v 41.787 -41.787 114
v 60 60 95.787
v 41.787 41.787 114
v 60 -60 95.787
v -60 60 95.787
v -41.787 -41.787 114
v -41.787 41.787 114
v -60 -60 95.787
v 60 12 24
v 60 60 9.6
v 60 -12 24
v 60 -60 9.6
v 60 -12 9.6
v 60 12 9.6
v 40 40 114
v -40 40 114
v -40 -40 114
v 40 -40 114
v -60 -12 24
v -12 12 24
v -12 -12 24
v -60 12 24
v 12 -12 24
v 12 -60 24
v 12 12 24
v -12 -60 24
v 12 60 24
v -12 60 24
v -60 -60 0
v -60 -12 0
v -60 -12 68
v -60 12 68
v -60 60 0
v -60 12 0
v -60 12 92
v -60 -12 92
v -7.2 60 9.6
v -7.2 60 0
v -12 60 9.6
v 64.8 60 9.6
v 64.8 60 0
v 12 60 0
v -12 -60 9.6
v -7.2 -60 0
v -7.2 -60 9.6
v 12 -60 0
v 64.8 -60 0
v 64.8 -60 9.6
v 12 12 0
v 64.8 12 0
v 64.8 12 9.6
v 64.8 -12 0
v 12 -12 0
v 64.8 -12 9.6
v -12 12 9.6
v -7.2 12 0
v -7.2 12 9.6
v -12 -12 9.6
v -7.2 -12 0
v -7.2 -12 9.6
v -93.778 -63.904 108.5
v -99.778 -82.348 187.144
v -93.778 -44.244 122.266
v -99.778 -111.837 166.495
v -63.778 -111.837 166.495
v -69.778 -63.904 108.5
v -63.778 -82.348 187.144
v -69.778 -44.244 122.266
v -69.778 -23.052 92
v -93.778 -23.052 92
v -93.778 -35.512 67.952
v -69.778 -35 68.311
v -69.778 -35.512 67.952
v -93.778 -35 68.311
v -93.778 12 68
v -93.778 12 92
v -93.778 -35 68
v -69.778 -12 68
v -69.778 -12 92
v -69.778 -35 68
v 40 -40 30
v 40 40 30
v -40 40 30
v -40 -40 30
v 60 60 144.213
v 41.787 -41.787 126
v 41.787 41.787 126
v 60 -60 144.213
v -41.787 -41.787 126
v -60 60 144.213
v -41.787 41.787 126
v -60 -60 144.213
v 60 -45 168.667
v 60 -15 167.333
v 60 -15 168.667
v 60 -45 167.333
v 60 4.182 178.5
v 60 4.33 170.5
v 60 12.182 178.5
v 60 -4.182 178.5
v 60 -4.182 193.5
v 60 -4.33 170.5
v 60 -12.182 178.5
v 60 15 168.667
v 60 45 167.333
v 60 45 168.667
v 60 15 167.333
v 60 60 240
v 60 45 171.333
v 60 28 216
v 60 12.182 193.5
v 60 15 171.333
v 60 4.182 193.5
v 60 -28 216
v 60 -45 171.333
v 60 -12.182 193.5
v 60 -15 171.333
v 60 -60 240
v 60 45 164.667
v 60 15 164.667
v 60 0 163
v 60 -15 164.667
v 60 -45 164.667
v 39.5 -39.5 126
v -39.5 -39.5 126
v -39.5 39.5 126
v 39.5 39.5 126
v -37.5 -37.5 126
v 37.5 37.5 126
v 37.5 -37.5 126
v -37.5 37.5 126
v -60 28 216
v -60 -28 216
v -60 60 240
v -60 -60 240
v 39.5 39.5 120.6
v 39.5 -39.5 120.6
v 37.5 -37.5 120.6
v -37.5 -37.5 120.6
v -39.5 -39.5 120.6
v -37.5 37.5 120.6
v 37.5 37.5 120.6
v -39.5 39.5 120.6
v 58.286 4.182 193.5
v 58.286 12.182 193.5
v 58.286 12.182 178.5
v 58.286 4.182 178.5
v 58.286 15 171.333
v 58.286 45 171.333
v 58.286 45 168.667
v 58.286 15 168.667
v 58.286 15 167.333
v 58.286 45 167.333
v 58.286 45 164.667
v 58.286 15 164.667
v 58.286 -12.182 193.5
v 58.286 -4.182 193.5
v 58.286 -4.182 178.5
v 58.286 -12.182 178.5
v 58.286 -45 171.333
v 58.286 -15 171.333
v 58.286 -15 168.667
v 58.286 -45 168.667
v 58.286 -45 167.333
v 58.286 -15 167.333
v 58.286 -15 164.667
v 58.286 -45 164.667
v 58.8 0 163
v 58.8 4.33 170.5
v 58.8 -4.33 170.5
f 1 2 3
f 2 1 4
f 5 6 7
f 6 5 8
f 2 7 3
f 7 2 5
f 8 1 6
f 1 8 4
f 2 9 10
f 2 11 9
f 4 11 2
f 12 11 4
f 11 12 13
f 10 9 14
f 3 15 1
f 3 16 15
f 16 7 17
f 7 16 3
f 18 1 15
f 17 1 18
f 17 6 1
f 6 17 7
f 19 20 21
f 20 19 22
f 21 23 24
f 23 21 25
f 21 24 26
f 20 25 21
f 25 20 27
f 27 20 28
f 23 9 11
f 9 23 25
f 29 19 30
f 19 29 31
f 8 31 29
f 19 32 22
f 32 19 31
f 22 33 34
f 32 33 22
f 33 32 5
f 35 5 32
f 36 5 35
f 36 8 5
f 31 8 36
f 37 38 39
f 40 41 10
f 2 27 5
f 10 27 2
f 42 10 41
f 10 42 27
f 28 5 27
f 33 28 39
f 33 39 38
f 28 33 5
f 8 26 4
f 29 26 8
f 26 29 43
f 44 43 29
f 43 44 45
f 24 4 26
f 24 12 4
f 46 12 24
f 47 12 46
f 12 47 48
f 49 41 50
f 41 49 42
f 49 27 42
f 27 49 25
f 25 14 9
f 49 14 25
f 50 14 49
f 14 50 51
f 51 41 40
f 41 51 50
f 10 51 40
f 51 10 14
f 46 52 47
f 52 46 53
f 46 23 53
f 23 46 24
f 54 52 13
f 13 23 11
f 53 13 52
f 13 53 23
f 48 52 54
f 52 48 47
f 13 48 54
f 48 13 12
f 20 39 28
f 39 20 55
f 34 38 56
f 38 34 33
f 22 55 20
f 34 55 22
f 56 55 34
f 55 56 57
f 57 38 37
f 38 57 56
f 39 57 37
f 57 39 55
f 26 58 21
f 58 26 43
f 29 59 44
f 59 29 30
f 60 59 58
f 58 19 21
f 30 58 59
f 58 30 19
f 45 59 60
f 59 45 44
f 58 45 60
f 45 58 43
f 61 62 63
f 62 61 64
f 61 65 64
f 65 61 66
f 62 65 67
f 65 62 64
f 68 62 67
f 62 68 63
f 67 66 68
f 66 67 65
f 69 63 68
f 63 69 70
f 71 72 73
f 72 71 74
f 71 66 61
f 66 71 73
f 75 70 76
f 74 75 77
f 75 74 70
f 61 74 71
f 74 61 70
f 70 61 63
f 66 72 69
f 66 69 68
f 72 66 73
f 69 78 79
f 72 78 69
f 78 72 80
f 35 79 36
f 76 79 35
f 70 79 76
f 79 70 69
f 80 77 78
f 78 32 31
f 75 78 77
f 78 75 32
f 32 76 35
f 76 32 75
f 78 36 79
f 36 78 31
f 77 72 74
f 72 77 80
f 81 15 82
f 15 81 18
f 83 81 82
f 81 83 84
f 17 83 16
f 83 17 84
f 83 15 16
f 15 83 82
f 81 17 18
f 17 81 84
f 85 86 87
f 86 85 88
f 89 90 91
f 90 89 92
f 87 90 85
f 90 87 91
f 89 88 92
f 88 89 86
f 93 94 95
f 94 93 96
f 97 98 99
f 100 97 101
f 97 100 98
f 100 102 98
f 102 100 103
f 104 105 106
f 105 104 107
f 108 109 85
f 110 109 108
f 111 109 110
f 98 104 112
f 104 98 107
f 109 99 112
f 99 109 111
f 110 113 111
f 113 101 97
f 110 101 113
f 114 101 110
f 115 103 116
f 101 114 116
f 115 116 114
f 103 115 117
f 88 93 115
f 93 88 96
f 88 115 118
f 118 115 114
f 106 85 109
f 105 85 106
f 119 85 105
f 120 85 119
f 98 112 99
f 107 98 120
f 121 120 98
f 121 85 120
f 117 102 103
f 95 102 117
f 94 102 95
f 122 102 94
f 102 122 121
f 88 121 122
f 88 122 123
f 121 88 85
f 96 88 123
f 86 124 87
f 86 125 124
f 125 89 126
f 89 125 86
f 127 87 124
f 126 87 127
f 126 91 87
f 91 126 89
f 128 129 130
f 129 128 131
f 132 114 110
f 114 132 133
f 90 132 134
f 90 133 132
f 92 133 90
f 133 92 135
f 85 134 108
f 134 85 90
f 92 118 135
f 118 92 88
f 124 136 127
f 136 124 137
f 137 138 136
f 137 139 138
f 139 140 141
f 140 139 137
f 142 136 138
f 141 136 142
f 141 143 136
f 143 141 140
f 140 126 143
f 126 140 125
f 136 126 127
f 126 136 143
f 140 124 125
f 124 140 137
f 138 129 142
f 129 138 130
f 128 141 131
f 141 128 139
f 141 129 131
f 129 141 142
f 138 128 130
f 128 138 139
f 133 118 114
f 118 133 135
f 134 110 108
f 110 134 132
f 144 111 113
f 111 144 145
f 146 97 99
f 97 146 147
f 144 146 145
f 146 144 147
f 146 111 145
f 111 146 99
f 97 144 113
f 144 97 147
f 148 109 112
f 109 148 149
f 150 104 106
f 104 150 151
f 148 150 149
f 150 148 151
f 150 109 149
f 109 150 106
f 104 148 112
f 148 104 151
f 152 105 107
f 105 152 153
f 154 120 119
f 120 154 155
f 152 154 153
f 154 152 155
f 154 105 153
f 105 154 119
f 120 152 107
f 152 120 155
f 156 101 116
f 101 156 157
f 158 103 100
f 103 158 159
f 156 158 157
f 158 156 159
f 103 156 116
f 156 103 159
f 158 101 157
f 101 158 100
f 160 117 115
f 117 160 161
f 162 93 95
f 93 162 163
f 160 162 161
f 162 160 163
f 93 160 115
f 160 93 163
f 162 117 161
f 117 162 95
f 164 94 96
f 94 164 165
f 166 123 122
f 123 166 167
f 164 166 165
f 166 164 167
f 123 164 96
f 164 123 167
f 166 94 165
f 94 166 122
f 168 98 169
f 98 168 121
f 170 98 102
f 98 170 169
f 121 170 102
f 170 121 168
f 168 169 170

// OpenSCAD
abdomen_size = 120;
neck_size = abdomen_size * 1.25;
paw_size = (abdomen_size/2) * 0.8;

module neck(size) {
  union() {
    translate([size/2, 0, 0])
      rotate([0, 45, 0])
      cube([size, size, size/5], center=true);

    translate([-size/2, 0, 0])
      rotate([0, -45, 0])
      cube([size, size, size/5], center=true);
  }

  rotate([0, 0, 90])
  union() {
    translate([size/2, 0, 0])
      rotate([0, 45, 0])
      cube([size, size, size/5], center=true);

    translate([-size/2, 0, 0])
      rotate([0, -45, 0])
      cube([size, size, size/5], center=true);
  }
}

module abdomen(size, neck_size) {
  difference() {
    translate([0, 0, (size*0.75/2) + size*0.2])
      cube([size, size, size*0.75], center=true);

    translate([0, 0, abdomen_size*0.85])
      neck(neck_size);
  }
}

module paw(size) {
  union() {
    translate([0, 0, size/2])
      cube([size, size, size], center=true);

    translate([size*0.1, 0, size/10])
      cube([size, size, size/5], center=true);
  }
}

module tail(size) {
  cube([2*size/5, size/5, size/5], center=true);

  translate([-size/5, size/10-size/5+0.5, 0])
  cube([size/5, 2*size/5-1, size/5], center=true);
  
  rotate_extrude(angle=90)
    square([size/5, size/5], center=true);

  rotate([0, -35, 90])
  union() {
    translate([-size/5, size/5, size/2])
      linear_extrude(height=75, scale=1.5)
      square(size/5, center=true);

    translate([-size/5, size/5, size/3+0.5])
      cube([size/5, size/5, size/2], center=true);
  }
}

module body(abdomen_size, neck_size, paw_size) {
  difference() {
    union() {
      abdomen(abdomen_size, neck_size);

      for (p = [
		[abdomen_size/2 - paw_size/2, abdomen_size/2 - paw_size/2, 0],
		[abdomen_size/2 - paw_size/2, -abdomen_size/2 + paw_size/2, 0],
		[-abdomen_size/2 + paw_size/2, abdomen_size/2 - paw_size/2, 0],
		[-abdomen_size/2 + paw_size/2, -abdomen_size/2 + paw_size/2, 0]
		]) {
        translate(p)
	  paw(paw_size);
      }

      translate([-13*abdomen_size/27, 0, 6*abdomen_size/9])
	tail(abdomen_size);
    }

    translate([0, 0, abdomen_size*0.75])
      cube([2*abdomen_size/3, 2*abdomen_size/3, abdomen_size], center=true);
  }
}

module ear(size) {
  rotate([0, 90, 0])
  linear_extrude(height = size)
    polygon([[0, 0],
	     [size/4, 0],
	     [size/4, size/3],
	     [0, 0]]);
}

module whisker(p, w, l, h) {
  translate(p)
    cube([w, l, h], center=true);
}

module eye(p, w, l, h) {
  translate(p)
    cube([w, l, h], center=true);
}

module face_half(p, size) {
  translate(p) {
    /* eye */
    eye([0, -size/5.5, size/5], size/35, size/15, size/8);

    /* Top whisker */
    whisker([0, 0, size/15], size/35, size/4, size/45);

    /* bottom whisker */
    whisker([0, 0, size/30], size/35, size/4, size/45);
  }
}

module face(size) {
  face_half([size/2, size/4, -size*0.65], size);

  mirror([0, 1, 0])
    face_half([size/2, size/4, -size*0.65], size);

  rotate([0, 90, 0])
    translate([size*0.60, 0, size*0.49])
    cylinder(h = size, r=5, $fn=3);
}

module head(size, neck_size) {
  difference() {
    union() {
      mirror([0, 0, 1])
	abdomen(size, neck_size);

      translate([-size/2, -size/2, 0])
	ear(abdomen_size);

      mirror([0, 1, 0])
	translate([-size/2, -size/2, 0])
	ear(abdomen_size);

      /* box lip */
      translate([0, 0, -abdomen_size*0.87]) {
	difference() {
	  cube([2*abdomen_size/3 - 1, 2*abdomen_size/3 - 1, abdomen_size/4], center=true);

	  translate([0, 0, -1])
	    cube([2*abdomen_size/3 - 5, 2*abdomen_size/3 - 5, abdomen_size/4 + 2], center=true);
        }
      }
    }

    face(size);
  }
}

body(abdomen_size, neck_size, paw_size);

translate([0, 0, abdomen_size*2])
head(abdomen_size, neck_size);
